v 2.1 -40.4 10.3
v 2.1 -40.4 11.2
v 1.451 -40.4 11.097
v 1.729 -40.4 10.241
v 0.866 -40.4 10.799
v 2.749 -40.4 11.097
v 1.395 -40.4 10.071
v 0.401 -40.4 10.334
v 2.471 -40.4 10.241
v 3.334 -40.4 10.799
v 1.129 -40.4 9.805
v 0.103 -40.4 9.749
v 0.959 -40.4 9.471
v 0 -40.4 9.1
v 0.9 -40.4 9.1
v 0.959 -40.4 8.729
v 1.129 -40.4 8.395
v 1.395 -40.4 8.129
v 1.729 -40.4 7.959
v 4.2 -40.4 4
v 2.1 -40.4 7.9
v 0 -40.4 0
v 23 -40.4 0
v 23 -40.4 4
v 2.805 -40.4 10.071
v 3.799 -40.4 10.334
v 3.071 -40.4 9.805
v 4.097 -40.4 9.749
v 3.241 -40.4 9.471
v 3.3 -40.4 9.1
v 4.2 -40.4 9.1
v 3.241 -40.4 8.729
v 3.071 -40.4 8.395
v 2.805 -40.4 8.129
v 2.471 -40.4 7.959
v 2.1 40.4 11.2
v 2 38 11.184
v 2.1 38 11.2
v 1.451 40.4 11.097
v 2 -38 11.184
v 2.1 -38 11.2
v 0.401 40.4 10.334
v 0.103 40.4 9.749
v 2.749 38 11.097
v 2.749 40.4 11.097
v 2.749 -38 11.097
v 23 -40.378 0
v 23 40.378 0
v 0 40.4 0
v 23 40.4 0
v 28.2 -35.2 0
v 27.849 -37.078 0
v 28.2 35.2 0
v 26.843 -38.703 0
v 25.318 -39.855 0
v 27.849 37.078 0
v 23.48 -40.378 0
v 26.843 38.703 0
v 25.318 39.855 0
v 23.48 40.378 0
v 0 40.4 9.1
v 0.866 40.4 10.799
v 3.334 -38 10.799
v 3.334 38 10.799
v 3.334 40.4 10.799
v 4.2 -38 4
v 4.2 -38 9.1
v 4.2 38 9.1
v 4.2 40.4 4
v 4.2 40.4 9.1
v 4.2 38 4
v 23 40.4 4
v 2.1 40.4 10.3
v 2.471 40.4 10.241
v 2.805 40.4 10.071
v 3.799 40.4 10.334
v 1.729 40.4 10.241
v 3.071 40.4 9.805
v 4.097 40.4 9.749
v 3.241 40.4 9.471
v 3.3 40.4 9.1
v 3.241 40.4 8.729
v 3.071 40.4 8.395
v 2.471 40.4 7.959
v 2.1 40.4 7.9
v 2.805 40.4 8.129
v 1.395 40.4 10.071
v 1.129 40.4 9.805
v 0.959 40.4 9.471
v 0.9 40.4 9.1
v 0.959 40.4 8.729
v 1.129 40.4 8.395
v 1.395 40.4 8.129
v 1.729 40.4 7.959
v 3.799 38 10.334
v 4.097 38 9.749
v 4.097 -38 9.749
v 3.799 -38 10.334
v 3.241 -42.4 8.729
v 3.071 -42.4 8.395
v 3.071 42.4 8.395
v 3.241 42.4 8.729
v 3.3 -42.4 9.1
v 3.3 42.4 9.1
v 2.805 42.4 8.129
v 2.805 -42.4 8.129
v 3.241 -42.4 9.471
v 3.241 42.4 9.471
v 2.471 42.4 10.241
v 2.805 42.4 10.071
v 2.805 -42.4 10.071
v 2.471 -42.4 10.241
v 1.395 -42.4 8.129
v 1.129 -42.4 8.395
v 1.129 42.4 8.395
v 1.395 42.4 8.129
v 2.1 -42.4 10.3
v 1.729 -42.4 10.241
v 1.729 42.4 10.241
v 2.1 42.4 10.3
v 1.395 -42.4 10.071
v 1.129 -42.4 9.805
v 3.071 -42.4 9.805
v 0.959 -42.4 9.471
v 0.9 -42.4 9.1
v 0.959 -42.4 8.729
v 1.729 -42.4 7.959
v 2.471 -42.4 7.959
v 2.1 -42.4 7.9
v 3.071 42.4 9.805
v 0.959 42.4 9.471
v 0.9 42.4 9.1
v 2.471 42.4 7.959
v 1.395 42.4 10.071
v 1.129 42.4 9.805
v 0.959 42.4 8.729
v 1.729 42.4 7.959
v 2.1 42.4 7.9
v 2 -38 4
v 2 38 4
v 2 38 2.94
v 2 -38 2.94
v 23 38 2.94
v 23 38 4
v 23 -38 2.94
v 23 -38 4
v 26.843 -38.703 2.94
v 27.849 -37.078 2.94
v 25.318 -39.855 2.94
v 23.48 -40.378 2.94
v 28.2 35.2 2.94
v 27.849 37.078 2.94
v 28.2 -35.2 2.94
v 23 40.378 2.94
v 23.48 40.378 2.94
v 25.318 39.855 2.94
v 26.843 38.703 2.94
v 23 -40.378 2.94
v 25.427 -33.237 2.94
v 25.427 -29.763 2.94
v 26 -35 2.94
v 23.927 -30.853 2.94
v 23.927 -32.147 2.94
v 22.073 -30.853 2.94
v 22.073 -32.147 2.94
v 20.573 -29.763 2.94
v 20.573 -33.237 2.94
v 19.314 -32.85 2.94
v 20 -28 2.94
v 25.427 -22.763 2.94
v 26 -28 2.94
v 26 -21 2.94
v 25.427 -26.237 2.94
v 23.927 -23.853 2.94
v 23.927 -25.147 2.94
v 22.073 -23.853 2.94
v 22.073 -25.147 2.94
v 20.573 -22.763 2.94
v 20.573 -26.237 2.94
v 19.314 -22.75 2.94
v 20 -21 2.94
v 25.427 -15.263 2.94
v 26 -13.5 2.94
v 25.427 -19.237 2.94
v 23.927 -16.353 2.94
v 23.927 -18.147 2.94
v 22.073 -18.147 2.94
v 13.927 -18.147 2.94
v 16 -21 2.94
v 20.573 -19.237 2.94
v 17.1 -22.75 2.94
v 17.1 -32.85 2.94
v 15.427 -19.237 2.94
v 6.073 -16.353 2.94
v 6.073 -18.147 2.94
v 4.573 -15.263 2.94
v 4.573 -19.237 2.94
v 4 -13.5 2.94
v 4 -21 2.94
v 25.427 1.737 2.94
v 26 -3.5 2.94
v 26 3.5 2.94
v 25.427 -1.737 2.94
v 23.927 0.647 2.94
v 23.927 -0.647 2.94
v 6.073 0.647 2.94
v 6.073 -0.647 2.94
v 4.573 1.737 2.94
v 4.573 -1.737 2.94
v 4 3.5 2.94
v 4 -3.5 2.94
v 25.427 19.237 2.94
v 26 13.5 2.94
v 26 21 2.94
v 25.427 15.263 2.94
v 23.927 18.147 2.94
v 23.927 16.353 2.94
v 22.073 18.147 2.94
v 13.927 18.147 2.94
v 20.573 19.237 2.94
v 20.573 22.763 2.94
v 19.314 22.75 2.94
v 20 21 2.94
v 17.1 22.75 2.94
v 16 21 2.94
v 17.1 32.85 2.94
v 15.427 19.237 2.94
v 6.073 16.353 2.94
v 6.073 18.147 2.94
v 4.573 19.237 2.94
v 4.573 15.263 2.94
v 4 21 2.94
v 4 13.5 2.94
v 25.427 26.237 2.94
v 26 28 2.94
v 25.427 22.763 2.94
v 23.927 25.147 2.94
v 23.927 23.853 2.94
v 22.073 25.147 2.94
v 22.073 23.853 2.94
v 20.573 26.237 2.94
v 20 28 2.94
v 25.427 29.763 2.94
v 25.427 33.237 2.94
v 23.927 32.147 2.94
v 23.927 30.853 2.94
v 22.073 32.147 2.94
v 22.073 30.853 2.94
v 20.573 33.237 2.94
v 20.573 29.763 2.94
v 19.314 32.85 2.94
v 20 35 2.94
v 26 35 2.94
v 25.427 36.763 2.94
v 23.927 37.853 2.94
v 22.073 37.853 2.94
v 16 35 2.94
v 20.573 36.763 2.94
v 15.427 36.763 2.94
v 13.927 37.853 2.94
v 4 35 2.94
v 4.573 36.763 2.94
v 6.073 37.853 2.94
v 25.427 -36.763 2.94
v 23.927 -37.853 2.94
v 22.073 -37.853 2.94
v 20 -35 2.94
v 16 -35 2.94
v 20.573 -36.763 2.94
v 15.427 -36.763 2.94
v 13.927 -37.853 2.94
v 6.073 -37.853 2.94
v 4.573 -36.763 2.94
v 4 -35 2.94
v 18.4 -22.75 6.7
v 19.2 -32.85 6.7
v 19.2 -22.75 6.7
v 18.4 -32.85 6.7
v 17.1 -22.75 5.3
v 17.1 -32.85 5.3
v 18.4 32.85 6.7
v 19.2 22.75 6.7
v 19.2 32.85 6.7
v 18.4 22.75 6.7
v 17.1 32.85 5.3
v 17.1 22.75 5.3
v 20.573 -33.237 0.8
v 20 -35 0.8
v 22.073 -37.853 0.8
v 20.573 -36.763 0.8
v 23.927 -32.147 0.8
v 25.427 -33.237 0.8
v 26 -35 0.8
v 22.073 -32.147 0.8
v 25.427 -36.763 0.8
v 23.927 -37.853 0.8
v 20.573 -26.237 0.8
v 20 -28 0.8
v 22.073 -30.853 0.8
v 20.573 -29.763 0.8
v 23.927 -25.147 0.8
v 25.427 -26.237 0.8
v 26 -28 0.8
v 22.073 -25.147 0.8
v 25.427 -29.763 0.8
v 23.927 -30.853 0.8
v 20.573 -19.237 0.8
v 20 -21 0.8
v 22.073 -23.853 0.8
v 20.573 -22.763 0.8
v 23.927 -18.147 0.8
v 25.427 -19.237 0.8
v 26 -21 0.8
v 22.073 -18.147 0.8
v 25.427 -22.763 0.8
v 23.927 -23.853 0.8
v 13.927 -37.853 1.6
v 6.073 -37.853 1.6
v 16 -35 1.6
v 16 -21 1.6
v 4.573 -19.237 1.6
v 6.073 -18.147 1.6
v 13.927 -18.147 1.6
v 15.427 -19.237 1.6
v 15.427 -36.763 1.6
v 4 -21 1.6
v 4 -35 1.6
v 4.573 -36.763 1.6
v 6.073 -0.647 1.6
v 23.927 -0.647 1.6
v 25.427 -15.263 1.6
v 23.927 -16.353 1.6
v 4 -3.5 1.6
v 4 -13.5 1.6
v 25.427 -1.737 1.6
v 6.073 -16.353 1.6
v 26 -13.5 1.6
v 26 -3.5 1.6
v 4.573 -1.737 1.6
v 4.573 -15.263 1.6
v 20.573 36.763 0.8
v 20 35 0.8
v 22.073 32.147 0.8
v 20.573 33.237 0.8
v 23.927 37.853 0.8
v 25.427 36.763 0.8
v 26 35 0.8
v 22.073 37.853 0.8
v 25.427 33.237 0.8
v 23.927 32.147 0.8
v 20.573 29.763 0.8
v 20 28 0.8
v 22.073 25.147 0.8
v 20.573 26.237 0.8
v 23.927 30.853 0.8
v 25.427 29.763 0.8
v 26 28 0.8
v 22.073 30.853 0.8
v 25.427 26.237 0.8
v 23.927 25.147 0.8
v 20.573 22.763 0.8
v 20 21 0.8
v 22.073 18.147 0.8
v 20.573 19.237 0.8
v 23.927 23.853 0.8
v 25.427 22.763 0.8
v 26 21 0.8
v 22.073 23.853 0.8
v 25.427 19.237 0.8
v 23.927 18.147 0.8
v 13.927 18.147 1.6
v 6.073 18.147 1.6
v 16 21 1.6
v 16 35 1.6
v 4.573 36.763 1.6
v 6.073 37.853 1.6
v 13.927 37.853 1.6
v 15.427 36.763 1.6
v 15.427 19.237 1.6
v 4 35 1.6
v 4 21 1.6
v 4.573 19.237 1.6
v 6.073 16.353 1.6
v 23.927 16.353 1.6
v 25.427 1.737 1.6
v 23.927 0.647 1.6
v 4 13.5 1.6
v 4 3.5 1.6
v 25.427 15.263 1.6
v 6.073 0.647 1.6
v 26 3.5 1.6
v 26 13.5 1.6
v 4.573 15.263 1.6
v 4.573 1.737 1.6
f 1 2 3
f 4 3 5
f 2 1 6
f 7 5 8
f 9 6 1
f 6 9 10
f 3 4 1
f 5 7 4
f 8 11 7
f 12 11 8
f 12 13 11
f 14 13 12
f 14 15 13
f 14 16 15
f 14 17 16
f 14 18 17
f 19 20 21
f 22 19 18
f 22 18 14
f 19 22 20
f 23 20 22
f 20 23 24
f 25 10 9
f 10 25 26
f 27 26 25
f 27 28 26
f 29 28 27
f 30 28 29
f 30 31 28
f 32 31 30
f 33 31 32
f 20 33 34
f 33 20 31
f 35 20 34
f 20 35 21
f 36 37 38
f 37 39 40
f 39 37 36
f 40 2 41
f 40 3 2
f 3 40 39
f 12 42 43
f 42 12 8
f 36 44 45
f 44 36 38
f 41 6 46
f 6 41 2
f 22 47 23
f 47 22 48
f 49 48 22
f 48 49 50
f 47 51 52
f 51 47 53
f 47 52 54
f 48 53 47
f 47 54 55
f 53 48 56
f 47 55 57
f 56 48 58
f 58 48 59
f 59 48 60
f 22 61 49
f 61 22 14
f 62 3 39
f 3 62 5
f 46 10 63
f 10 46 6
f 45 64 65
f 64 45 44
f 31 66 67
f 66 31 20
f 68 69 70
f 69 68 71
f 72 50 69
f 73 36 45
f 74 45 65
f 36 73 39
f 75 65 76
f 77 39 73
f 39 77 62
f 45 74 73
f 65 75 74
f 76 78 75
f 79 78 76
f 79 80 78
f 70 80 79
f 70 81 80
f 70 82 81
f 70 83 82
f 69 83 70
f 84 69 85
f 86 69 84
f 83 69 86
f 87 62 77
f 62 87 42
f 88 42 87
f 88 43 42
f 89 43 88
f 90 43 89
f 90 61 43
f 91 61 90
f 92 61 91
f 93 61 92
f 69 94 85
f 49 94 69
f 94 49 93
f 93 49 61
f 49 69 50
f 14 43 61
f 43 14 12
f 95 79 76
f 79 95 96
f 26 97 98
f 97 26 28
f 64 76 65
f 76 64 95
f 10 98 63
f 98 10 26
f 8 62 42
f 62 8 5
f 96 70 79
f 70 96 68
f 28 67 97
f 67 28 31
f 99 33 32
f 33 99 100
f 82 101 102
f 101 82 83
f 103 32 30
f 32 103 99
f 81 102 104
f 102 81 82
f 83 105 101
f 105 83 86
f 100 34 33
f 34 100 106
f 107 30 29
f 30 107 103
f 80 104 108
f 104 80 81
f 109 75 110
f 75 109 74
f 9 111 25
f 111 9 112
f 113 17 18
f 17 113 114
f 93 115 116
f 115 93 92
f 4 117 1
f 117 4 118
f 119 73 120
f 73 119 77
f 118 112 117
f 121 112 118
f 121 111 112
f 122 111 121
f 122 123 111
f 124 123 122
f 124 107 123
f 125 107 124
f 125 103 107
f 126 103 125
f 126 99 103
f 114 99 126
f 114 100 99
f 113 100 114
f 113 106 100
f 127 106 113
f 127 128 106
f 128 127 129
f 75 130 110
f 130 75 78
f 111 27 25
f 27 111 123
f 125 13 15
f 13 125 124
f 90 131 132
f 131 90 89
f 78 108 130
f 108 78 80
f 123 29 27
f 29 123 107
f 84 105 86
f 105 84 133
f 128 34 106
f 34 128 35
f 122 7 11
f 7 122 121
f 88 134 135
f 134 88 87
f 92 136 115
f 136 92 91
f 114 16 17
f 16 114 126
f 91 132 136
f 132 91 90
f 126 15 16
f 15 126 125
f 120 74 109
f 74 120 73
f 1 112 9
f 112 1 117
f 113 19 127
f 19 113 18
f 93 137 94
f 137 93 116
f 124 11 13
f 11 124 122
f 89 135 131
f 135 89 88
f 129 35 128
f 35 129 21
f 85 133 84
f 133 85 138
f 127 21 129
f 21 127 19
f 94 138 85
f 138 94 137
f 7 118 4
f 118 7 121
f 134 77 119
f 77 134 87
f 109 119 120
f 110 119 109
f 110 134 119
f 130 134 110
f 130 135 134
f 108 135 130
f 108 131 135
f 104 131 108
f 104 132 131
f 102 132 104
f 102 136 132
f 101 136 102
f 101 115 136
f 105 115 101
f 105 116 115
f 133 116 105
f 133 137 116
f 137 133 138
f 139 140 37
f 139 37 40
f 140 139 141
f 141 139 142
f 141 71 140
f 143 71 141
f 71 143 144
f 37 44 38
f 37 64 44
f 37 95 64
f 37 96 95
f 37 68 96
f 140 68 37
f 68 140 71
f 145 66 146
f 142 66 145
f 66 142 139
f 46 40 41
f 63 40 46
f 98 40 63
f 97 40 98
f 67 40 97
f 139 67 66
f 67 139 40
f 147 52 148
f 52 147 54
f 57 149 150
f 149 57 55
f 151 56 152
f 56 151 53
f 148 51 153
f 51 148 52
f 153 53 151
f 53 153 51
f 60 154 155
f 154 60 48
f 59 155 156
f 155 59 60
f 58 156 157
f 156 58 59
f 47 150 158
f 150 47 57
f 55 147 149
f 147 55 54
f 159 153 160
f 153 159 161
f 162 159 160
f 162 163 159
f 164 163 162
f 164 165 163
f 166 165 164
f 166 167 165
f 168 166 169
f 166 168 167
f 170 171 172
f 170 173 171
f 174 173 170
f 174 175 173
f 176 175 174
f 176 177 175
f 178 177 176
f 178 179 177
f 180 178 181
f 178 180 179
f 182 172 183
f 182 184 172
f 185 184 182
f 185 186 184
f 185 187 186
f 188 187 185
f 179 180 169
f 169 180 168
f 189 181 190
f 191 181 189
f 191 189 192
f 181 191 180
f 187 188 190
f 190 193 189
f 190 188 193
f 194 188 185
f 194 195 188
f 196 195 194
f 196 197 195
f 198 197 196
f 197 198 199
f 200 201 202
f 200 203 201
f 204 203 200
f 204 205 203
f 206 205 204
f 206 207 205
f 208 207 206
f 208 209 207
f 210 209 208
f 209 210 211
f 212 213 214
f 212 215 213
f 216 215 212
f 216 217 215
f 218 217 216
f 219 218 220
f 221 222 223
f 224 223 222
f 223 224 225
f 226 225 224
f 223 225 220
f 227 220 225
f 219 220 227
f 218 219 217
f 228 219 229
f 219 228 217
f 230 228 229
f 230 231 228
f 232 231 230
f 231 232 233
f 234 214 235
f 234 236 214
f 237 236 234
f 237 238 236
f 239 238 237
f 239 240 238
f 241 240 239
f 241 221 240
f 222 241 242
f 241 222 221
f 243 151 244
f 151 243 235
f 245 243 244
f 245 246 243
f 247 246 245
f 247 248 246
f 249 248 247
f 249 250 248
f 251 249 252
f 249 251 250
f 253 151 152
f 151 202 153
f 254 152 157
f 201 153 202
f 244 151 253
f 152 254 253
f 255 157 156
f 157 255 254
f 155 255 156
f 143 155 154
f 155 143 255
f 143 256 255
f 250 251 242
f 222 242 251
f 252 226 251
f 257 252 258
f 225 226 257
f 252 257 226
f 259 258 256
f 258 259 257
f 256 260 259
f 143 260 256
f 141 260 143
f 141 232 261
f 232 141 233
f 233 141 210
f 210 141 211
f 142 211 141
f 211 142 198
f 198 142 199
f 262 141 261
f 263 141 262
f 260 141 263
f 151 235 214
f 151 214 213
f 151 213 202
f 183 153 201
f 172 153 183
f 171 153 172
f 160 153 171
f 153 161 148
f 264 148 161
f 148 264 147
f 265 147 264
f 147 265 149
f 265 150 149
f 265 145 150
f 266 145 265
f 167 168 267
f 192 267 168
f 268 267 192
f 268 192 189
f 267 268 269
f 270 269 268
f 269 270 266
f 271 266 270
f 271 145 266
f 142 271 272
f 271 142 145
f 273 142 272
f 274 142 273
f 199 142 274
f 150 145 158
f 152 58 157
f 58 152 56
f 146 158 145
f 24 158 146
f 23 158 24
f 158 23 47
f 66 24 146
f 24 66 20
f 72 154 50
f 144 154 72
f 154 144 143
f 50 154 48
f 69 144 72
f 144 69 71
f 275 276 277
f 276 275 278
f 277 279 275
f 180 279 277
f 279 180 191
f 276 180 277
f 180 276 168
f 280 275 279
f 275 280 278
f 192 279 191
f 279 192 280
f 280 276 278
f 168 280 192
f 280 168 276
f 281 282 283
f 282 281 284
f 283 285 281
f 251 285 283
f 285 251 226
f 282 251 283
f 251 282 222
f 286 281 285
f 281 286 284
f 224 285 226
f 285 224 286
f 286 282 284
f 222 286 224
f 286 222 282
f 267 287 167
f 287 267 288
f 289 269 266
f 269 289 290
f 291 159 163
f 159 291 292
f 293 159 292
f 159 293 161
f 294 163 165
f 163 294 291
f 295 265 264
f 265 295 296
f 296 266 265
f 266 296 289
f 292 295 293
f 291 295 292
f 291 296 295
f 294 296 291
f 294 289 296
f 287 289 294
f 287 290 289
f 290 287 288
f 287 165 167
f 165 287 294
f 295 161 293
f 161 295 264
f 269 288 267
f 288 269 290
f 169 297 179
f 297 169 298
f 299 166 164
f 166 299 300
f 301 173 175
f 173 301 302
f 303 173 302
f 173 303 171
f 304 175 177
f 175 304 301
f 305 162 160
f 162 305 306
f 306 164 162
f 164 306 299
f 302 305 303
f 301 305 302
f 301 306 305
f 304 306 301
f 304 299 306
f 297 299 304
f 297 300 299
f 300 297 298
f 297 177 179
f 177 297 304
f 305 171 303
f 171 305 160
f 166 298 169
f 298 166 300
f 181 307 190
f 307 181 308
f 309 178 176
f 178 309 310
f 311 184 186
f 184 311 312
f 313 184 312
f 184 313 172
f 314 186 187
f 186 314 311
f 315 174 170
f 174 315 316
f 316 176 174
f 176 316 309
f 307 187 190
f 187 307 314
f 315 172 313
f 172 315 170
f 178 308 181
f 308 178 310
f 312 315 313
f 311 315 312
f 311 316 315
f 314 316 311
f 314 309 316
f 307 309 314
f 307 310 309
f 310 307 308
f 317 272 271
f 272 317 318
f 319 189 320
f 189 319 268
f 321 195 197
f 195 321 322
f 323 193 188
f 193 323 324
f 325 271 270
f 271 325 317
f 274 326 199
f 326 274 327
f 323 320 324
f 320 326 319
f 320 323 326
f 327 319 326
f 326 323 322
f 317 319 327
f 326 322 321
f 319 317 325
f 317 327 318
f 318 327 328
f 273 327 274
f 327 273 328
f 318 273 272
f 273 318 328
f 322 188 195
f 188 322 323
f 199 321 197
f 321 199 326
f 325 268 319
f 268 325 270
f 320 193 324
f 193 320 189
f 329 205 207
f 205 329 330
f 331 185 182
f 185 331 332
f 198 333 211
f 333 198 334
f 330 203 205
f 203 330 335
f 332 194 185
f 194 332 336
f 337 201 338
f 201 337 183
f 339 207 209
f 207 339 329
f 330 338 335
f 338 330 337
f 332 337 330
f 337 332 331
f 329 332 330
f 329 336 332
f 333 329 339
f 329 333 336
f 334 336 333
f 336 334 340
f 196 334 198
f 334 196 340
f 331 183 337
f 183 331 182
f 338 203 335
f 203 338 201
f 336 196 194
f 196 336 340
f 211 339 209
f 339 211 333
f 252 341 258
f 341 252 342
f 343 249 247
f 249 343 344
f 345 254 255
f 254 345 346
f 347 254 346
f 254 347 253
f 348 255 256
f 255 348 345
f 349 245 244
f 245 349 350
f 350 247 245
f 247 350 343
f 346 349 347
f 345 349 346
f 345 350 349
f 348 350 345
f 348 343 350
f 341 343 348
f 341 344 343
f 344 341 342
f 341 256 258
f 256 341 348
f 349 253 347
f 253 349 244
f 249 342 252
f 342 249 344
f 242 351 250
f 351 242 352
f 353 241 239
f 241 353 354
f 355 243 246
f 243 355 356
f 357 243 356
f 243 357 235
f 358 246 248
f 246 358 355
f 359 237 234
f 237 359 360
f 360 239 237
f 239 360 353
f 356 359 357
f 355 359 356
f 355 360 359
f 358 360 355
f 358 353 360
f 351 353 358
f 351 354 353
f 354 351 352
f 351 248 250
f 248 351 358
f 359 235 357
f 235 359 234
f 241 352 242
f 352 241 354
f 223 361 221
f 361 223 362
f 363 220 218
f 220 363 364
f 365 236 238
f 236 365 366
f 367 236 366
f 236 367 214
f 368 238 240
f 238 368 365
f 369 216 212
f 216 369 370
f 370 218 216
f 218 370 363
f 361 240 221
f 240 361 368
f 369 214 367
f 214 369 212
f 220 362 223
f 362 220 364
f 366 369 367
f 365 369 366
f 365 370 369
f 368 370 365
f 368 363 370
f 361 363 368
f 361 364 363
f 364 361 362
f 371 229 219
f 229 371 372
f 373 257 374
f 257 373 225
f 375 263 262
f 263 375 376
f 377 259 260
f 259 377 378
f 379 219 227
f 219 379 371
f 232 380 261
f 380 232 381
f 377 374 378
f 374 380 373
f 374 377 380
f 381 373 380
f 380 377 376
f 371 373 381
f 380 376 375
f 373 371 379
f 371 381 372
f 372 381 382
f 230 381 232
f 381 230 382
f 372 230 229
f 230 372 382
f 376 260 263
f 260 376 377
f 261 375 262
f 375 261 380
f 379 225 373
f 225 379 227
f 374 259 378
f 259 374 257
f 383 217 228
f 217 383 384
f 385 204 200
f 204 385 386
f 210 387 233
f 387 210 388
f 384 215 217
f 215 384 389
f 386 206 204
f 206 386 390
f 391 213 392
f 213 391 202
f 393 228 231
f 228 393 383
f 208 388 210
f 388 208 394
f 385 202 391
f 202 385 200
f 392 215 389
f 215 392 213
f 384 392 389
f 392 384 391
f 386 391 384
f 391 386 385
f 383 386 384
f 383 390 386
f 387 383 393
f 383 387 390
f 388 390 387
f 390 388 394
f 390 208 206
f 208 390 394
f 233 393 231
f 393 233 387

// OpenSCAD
//
// Locking flap
//

body_yw = 80.8;
body_xw = 28.2;
body_corner_r = 5.2;
body_base_th = 2.94;

upr_axis_zh = 9.1;
upr_r = 2.1;

stf_th = 2.4;
stf_zth = 4.0;   // Measures 4.06, but one layer is 0.2 mm.

flap_yw = 10.1;
flap_yoff = 27.8;

module flap_body () {

    // The bottom
    hull () {
        translate([0, (body_yw/2)*-1, 0])
            cube([1.0, body_yw, body_base_th]);
        translate([body_xw-body_corner_r, (body_yw/2-body_corner_r)*-1, 0])
            cylinder(body_base_th, r=body_corner_r);
        translate([body_xw-body_corner_r, body_yw/2-body_corner_r, 0])
            cylinder(body_base_th, r=body_corner_r);
    }

    difference () {
        union () {
            // The upright
            hull () {
                translate([0, (body_yw/2)*-1, 0])
                    cube([upr_r*2, body_yw, 1.0]);
                translate([upr_r, (body_yw/2)*-1, upr_axis_zh])
                    rotate(-90.0, [1,0,0])
                        cylinder(body_yw, r=upr_r, $fn=20);
            }
            // The axis
            translate([upr_r, ((body_yw+4.0)/2)*-1, upr_axis_zh])
                rotate(-90.0, [1,0,0])
                    cylinder((body_yw+4.0), r=1.2, $fn=20);
       }

       translate([2.0, ((body_yw-2*stf_th)/2)*-1, 0])
            cube([upr_r*2, body_yw-2*stf_th, upr_axis_zh+upr_r]);
    }

    // Side stiffeners
    // These also regulate the contact when the flap is closed.
    translate([0, (body_yw/2)*-1, 0])
        cube([body_xw-body_corner_r, stf_th, stf_zth]);
    translate([0, body_yw/2 - stf_th, 0])
        cube([body_xw-body_corner_r, stf_th, stf_zth]);
}

module flap_pawl () {
    translate([0, (flap_yw/2)*-1, 0]) {
        hull () {
            translate([-2.1, 0, 0])
               cube([2.3, flap_yw, 0.1]);
            translate([-2.1, 0, 5.2])
               cube([2.1, flap_yw, 0.1]);
            translate([-0.8, 0, 6.6])
               cube([0.8, flap_yw, 0.1]);
        }
    }
}

module flap_pawls () {
    translate([19.2, flap_yoff*-1, 0])
        flap_pawl();
    translate([19.2, flap_yoff, 0])
        flap_pawl();
}

module dewarping () {
    dew_off = 0.8;

    // Negative
    translate([23.0, -35.0, dew_off])
        cylinder(body_base_th-dew_off+0.01, r=3.0);
    translate([23.0, -28.0, dew_off])
        cylinder(body_base_th-dew_off+0.01, r=3.0);
    translate([23.0, -21.0, dew_off])
        cylinder(body_base_th-dew_off+0.01, r=3.0);

    translate([10.0, -28.0, dew_off]) {
        hull () {
            translate([-3.0, 7.0, dew_off])
                cylinder(body_base_th-dew_off+0.01, r=3.0);
            translate([-3.0, -7.0, dew_off])
                cylinder(body_base_th-dew_off+0.01, r=3.0);
            translate([ 3.0, -7.0, dew_off])
                cylinder(body_base_th-dew_off+0.01, r=3.0);
            translate([ 3.0, 7.0, dew_off])
                cylinder(body_base_th-dew_off+0.01, r=3.0);
        }
    }

    translate([15.0, -8.5, dew_off]) {
        hull () {
            translate([-8.0,  5.0, dew_off])
                cylinder(body_base_th-dew_off+0.01, r=3.0);
            translate([-8.0, -5.0, dew_off])
                cylinder(body_base_th-dew_off+0.01, r=3.0);
            translate([ 8.0, -5.0, dew_off])
                cylinder(body_base_th-dew_off+0.01, r=3.0);
            translate([ 8.0,  5.0, dew_off])
                cylinder(body_base_th-dew_off+0.01, r=3.0);
        }
    }

    // Positive
    translate([23.0, 35.0, dew_off])
        cylinder(body_base_th-dew_off+0.01, r=3.0);
    translate([23.0, 28.0, dew_off])
        cylinder(body_base_th-dew_off+0.01, r=3.0);
    translate([23.0, 21.0, dew_off])
        cylinder(body_base_th-dew_off+0.01, r=3.0);

    translate([10.0, 28.0, dew_off]) {
        hull () {
            translate([-3.0, 7.0, dew_off])
                cylinder(body_base_th-dew_off+0.01, r=3.0);
            translate([-3.0, -7.0, dew_off])
                cylinder(body_base_th-dew_off+0.01, r=3.0);
            translate([ 3.0, -7.0, dew_off])
                cylinder(body_base_th-dew_off+0.01, r=3.0);
            translate([ 3.0, 7.0, dew_off])
                cylinder(body_base_th-dew_off+0.01, r=3.0);
        }
    }

    translate([15.0, 8.5, dew_off]) {
        hull () {
            translate([-8.0,  5.0, dew_off])
                cylinder(body_base_th-dew_off+0.01, r=3.0);
            translate([-8.0, -5.0, dew_off])
                cylinder(body_base_th-dew_off+0.01, r=3.0);
            translate([ 8.0, -5.0, dew_off])
                cylinder(body_base_th-dew_off+0.01, r=3.0);
            translate([ 8.0,  5.0, dew_off])
                cylinder(body_base_th-dew_off+0.01, r=3.0);
        }
    }
}

module flap () {
    difference () {
        union () {
            flap_body();
            flap_pawls();
        }
        dewarping();
    }
}

flap();
